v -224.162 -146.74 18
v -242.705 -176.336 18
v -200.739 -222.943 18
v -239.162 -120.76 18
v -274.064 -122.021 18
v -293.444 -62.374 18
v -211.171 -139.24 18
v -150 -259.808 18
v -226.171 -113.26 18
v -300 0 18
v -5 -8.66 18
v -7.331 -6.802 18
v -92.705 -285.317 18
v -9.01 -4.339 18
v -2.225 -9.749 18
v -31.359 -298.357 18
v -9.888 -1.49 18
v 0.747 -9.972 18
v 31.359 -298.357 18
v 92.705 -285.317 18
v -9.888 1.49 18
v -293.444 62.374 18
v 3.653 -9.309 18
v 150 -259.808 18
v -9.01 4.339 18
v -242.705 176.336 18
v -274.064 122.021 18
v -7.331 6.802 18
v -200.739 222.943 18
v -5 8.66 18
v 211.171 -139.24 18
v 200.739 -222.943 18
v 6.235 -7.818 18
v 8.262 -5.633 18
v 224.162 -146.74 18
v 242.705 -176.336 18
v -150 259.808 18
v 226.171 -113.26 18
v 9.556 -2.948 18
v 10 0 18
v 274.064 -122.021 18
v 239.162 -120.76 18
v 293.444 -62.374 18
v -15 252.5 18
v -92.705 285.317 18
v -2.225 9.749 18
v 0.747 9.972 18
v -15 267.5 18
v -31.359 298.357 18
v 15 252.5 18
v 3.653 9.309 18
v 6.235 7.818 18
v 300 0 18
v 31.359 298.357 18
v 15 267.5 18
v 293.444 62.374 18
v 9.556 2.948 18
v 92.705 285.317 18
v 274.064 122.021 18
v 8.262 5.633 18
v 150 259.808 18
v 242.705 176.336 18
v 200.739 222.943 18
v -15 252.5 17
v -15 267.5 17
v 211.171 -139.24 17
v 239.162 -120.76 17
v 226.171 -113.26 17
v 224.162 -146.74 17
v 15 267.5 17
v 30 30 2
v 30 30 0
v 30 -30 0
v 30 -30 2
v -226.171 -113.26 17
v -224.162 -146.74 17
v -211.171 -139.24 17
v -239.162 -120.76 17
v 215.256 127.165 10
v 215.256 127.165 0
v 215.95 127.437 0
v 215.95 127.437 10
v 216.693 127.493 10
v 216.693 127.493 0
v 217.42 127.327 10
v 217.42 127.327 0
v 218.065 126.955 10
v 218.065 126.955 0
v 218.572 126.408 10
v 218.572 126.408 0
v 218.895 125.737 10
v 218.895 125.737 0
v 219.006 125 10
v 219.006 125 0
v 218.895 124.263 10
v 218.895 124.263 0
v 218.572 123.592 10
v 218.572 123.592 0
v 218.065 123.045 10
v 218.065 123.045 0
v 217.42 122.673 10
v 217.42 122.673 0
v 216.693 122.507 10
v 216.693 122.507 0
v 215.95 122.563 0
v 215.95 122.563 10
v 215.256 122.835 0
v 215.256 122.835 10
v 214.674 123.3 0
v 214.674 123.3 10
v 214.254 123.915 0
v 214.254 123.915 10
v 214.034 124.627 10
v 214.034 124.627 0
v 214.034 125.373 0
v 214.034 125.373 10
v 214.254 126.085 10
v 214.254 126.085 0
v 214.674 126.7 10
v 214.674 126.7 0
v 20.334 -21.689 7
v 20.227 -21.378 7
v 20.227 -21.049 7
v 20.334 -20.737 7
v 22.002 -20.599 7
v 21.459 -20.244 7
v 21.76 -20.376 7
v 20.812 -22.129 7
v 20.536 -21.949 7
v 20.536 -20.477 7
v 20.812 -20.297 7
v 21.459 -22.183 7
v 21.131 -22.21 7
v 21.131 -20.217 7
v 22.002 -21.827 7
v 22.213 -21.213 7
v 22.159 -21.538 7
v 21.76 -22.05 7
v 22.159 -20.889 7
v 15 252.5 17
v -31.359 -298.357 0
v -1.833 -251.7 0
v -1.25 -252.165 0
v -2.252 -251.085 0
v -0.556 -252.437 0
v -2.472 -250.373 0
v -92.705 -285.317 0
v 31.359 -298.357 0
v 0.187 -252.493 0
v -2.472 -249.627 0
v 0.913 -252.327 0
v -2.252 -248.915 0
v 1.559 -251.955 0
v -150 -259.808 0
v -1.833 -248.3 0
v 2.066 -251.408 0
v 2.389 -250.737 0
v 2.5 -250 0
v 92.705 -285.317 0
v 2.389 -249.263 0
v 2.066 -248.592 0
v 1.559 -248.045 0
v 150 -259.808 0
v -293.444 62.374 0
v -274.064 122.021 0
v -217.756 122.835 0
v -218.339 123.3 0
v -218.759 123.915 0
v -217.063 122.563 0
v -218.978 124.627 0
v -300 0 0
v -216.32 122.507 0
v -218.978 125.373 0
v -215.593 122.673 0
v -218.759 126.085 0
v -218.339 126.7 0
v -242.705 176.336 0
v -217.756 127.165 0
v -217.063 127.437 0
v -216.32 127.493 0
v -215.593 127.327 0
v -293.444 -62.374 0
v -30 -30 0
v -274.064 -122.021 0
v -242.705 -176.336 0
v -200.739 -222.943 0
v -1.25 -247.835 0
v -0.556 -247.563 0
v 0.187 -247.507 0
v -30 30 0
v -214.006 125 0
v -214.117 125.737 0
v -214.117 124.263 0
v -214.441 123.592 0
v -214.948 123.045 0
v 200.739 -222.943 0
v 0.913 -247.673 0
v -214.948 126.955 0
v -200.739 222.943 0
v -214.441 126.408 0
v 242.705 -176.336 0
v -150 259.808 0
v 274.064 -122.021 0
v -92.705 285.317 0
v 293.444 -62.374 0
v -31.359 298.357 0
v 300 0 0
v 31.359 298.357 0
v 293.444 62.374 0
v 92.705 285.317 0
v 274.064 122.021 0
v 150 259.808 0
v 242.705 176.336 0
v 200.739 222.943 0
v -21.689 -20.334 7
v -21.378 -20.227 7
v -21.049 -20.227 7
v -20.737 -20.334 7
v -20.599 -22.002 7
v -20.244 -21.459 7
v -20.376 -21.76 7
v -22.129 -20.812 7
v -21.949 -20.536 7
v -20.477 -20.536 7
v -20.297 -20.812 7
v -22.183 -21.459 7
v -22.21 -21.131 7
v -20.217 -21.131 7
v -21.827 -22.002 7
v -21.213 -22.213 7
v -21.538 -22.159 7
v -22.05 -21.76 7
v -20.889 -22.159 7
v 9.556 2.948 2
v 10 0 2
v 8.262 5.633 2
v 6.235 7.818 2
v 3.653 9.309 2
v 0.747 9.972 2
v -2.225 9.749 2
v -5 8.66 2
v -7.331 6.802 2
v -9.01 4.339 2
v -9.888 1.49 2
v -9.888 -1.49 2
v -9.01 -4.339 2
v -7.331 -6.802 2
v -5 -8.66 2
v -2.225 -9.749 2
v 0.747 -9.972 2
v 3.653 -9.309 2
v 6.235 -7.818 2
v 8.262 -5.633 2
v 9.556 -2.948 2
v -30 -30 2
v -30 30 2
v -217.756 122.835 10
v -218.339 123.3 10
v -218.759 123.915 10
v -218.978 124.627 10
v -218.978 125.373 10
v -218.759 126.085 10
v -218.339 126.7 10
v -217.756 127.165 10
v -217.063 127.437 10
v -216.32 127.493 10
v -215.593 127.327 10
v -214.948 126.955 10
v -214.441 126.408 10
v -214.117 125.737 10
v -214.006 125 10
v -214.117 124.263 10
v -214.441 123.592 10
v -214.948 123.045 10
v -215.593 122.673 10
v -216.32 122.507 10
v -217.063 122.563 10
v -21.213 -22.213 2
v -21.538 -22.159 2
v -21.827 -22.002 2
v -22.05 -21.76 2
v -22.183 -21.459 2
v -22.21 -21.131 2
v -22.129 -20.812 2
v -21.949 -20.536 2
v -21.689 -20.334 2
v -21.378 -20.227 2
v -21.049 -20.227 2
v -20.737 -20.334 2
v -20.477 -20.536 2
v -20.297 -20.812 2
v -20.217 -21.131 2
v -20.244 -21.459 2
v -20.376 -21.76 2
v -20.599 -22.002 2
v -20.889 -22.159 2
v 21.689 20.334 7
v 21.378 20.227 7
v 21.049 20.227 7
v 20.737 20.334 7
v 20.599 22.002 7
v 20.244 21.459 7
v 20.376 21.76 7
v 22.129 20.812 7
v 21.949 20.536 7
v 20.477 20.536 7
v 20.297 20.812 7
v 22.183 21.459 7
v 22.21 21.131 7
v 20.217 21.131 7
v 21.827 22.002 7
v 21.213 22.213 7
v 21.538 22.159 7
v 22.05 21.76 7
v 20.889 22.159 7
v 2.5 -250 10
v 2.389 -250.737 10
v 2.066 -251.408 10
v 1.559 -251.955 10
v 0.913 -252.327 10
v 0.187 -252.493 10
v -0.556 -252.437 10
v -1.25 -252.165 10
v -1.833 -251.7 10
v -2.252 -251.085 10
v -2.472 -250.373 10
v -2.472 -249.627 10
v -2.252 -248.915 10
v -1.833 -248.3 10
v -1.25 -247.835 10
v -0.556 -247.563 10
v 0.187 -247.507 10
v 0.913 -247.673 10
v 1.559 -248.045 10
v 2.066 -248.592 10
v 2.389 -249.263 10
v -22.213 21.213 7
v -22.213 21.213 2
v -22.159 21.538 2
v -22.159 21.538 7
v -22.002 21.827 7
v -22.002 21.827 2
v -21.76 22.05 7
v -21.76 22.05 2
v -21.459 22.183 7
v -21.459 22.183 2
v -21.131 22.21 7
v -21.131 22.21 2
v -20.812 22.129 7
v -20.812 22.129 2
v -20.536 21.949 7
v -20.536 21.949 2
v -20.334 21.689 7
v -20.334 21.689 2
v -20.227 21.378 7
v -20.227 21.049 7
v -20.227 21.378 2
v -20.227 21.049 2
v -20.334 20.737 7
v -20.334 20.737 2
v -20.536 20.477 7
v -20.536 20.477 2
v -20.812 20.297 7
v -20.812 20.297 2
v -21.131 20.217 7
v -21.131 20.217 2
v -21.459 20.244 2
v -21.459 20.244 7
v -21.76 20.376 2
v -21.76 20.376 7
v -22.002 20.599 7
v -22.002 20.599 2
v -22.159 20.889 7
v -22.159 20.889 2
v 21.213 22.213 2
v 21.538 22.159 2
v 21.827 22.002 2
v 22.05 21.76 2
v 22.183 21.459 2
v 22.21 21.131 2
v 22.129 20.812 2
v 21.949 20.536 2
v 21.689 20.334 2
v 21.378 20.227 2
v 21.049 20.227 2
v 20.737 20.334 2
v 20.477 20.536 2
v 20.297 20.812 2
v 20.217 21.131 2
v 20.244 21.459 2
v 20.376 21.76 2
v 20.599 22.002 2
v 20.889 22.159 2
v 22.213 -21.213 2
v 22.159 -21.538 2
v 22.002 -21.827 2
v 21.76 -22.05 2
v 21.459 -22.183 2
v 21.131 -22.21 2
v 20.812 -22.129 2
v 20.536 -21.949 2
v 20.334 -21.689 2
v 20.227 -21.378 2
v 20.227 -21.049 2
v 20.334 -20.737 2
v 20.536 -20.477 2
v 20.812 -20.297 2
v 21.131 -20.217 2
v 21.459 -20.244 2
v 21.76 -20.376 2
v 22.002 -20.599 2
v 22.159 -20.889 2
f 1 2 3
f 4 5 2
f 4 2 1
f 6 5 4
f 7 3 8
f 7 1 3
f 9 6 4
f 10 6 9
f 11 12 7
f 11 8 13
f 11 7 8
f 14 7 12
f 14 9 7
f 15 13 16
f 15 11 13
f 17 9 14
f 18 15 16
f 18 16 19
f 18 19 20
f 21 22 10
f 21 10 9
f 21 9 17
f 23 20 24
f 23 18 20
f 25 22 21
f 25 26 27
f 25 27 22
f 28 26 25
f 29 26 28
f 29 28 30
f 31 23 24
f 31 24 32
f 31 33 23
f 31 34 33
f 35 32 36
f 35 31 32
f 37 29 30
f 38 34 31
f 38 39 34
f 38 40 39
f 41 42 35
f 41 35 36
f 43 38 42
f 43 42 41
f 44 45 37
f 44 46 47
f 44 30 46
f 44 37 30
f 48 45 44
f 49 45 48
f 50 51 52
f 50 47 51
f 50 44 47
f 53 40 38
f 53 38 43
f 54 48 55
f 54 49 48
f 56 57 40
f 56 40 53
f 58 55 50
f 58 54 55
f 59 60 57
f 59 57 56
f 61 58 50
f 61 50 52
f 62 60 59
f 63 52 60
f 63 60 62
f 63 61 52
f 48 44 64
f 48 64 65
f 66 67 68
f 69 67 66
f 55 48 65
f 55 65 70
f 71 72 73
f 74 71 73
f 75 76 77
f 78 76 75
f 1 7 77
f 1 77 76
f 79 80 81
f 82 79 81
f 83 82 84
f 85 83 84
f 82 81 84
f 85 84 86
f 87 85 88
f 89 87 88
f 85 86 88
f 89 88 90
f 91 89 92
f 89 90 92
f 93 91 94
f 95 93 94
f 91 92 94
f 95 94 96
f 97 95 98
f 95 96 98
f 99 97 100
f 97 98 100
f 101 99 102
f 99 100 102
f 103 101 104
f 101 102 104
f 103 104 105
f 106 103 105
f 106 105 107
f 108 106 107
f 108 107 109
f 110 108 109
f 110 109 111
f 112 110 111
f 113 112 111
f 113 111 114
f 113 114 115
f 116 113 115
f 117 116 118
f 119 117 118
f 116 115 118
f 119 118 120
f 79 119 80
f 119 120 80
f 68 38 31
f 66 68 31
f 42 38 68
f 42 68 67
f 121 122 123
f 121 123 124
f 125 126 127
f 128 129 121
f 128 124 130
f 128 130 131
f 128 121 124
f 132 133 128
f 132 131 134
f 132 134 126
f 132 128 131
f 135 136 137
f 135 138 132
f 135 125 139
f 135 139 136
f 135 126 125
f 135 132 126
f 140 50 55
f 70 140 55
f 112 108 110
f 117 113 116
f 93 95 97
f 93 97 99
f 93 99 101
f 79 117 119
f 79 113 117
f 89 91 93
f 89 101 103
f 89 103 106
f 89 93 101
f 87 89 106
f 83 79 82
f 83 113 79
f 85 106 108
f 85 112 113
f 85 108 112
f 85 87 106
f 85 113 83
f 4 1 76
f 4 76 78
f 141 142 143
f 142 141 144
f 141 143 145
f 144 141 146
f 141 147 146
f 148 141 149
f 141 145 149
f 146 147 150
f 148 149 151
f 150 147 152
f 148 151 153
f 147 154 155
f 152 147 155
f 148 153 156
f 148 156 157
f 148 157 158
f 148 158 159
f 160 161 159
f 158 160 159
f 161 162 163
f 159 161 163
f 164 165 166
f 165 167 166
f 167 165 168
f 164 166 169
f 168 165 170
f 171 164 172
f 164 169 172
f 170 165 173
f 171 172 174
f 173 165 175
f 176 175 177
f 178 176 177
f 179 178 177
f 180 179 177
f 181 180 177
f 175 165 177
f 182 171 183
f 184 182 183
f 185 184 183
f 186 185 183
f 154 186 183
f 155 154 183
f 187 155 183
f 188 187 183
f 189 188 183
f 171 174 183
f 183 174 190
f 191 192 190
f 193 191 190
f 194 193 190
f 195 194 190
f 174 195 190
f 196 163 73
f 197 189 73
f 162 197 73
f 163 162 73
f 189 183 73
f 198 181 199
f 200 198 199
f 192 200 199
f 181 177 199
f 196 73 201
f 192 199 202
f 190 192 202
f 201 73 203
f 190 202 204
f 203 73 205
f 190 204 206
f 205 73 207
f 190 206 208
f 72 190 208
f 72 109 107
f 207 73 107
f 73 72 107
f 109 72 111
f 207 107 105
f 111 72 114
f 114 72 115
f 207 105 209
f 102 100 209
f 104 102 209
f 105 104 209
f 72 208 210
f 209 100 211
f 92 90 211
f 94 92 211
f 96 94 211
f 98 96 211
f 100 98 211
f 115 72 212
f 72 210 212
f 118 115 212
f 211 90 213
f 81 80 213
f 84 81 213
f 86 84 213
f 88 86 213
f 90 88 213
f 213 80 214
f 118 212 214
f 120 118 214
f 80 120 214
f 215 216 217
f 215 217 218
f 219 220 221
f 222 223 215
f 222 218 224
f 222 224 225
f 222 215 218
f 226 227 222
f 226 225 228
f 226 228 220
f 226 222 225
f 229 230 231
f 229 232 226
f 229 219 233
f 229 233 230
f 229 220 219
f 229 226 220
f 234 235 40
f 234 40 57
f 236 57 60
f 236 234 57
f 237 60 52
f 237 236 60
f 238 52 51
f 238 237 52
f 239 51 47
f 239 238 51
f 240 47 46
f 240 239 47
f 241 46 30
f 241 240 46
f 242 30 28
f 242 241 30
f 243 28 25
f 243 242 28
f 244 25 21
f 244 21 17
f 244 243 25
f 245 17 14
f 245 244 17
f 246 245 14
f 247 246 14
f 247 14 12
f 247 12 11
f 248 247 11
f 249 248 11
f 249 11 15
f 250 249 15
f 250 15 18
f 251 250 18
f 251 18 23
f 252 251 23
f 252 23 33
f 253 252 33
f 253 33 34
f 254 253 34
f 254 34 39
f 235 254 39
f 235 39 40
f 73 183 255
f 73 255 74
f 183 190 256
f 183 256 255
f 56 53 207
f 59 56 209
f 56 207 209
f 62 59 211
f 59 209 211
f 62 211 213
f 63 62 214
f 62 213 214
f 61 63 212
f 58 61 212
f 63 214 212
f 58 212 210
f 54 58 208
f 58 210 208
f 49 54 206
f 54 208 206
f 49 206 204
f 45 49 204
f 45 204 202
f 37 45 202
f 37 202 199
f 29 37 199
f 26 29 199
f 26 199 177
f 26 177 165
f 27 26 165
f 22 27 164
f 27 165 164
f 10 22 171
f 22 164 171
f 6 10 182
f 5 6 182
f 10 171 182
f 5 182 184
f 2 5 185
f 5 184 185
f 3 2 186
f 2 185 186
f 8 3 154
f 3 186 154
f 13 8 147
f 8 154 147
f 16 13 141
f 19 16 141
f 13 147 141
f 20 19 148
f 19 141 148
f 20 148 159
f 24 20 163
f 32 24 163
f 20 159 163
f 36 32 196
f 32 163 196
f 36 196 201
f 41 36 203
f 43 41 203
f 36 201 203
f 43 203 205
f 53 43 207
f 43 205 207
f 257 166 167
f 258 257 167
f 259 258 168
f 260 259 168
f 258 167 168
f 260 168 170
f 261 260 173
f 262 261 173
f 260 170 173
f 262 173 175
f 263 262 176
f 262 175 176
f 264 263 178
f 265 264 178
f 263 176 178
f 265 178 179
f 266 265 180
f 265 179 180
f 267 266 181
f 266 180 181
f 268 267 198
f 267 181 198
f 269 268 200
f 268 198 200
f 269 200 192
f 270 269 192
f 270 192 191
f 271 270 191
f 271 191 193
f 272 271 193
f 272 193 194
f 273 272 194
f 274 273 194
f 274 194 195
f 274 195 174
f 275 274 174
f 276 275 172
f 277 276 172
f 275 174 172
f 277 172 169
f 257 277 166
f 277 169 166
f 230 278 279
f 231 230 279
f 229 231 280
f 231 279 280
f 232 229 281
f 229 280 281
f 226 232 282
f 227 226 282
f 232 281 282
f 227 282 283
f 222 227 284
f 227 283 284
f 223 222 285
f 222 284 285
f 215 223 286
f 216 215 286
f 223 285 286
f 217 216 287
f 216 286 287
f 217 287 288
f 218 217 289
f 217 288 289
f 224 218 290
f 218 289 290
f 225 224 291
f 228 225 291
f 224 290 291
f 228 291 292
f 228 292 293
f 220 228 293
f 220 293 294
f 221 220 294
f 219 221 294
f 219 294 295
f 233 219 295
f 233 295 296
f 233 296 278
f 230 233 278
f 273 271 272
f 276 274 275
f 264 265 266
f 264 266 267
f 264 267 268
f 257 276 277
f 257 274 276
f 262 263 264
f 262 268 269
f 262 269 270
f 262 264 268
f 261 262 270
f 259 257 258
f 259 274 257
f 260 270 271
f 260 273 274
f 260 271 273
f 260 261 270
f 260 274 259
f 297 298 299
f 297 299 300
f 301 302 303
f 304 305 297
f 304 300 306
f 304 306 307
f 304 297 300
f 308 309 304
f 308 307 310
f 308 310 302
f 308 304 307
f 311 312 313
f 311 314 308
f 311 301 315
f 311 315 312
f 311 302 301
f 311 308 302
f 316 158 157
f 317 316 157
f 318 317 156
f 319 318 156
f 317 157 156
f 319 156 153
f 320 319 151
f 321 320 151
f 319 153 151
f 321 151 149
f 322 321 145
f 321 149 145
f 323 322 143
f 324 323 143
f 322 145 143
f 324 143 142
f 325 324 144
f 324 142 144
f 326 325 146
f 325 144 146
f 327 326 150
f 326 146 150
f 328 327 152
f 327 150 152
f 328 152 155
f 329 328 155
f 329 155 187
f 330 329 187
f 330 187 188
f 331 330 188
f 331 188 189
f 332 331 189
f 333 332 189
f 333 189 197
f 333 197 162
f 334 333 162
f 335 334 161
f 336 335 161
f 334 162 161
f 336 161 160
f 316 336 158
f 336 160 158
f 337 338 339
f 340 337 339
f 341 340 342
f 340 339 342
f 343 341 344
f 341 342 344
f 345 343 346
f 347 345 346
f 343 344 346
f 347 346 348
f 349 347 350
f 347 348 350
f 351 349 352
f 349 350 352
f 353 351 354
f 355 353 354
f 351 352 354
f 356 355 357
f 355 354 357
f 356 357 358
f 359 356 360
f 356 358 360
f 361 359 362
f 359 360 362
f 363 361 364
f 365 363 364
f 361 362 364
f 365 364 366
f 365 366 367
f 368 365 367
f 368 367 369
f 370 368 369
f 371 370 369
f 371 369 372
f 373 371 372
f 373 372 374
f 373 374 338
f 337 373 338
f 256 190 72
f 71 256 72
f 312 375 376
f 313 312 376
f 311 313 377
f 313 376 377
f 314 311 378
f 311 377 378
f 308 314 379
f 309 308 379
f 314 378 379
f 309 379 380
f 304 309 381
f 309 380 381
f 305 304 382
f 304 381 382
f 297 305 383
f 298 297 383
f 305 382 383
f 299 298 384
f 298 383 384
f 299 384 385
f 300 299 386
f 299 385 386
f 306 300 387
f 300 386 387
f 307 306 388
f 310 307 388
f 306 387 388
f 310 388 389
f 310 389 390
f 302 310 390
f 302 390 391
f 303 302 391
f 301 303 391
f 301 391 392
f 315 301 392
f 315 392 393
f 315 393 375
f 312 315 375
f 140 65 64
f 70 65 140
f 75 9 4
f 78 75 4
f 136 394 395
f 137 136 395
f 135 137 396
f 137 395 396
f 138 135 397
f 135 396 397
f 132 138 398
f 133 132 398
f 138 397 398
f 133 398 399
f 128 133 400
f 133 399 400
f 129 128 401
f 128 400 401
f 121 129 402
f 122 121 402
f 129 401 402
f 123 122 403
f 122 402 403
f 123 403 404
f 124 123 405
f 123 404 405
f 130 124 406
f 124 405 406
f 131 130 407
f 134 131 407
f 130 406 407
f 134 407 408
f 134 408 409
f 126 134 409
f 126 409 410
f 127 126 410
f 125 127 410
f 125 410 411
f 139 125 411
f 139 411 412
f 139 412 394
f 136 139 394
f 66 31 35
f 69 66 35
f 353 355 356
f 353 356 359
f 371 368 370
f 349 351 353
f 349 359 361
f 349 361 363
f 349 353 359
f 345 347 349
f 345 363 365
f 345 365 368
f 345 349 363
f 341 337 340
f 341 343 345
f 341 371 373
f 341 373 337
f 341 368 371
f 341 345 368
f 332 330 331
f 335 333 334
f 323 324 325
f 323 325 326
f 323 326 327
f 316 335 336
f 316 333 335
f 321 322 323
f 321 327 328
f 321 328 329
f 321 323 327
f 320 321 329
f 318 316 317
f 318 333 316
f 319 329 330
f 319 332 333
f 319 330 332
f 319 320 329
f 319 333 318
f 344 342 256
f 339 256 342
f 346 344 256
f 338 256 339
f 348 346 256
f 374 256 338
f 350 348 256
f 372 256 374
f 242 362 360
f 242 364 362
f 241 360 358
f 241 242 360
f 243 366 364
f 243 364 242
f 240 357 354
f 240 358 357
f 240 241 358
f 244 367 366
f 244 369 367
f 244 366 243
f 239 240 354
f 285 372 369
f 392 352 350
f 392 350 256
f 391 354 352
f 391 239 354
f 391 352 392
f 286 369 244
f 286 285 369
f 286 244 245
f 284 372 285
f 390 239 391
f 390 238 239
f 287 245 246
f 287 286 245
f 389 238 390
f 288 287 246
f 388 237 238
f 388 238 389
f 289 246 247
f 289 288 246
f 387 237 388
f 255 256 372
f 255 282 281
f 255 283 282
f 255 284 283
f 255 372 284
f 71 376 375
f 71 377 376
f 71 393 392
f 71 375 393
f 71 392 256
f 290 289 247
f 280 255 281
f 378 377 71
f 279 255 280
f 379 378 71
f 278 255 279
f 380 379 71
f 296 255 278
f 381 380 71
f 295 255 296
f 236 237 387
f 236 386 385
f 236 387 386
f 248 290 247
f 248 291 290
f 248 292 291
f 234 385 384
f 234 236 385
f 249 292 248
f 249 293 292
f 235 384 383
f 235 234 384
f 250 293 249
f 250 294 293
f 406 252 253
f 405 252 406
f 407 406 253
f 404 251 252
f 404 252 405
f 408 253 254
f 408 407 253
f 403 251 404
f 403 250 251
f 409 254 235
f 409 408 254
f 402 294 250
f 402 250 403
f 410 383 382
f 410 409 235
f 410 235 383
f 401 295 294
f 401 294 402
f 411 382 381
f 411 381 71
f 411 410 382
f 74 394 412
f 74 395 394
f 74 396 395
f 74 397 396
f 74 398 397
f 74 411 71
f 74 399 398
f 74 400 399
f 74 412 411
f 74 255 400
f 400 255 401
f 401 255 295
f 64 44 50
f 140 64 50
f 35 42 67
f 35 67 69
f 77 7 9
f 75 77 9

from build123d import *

# Parameters (mm, degrees)
F0_R            = 300
F0_R_2          = 10
F1_DEPTH        = 18
F2_R            = 2.5
F3_DEPTH        = 10
F3_COPIES_COUNT = 3
F4_W            = 60
F4_H            = 60
F5_DEPTH        = 2
F6_R            = 1
F7_DEPTH        = 5
F7_COPIES_COUNT = 4
F8_W            = 30
F8_H            = 15
F9_DEPTH        = 1
F9_COPIES_COUNT = 3


# Not quite as in the source:
# - a pattern or mirror of a feature is missing from the dataset's text; its kind, count and spacing are read off the source's solid


with BuildPart() as f1:
    # F0 (on Top) → F1 (new body)
    with BuildSketch(Plane.XY):
        Circle(F0_R)
        Circle(F0_R_2, mode=Mode.SUBTRACT)
    extrude(amount=F1_DEPTH)

    # F2 (on face) → F3 (cut)
    with BuildSketch(Plane(origin=(0, 0, 0), x_dir=(1, 0, 0), z_dir=(0, 0, -1))):
        with Locations((0, 250)):
            Circle(F2_R)
    f3 = extrude(amount=-F3_DEPTH, mode=Mode.SUBTRACT)

    # F3_copies: F3 ×3 about axis
    f3_copies_axis = Axis((0, 0, 0), (0, 0, 1))
    for i in range(1, F3_COPIES_COUNT):
        add(f3.rotate(f3_copies_axis, i * 360 / F3_COPIES_COUNT), mode=Mode.SUBTRACT)

    # F4 (on face) → F5 (cut)
    with BuildSketch(Plane(origin=(0, 0, 0), x_dir=(1, 0, 0), z_dir=(0, 0, -1))):
        Rectangle(F4_W, F4_H)
    extrude(amount=-F5_DEPTH, mode=Mode.SUBTRACT)

    # F6 (on face) → F7 (cut)
    with BuildSketch(Plane(origin=(0, 0, 2), x_dir=(1, 0, 0), z_dir=(0, 0, -1))):
        with Locations((21.2132034356, 21.2132034356)):
            Circle(F6_R)
    f7 = extrude(amount=-F7_DEPTH, mode=Mode.SUBTRACT)

    # F7_copies: F7 ×4 about axis
    f7_copies_axis = Axis((0, 0, 0), (0, 0, 1))
    for i in range(1, F7_COPIES_COUNT):
        add(f7.rotate(f7_copies_axis, i * 360 / F7_COPIES_COUNT), mode=Mode.SUBTRACT)

    # F8 (on face) → F9 (cut)
    with BuildSketch(Plane.XY.offset(18)):
        with Locations((0, 260)):
            Rectangle(F8_W, F8_H)
    f9 = extrude(amount=-F9_DEPTH, mode=Mode.SUBTRACT)

    # F9_copies: F9 ×3 about axis
    f9_copies_axis = Axis((0, 0, 0), (0, 0, 1))
    for i in range(1, F9_COPIES_COUNT):
        add(f9.rotate(f9_copies_axis, i * 360 / F9_COPIES_COUNT), mode=Mode.SUBTRACT)


solid = f1.part
